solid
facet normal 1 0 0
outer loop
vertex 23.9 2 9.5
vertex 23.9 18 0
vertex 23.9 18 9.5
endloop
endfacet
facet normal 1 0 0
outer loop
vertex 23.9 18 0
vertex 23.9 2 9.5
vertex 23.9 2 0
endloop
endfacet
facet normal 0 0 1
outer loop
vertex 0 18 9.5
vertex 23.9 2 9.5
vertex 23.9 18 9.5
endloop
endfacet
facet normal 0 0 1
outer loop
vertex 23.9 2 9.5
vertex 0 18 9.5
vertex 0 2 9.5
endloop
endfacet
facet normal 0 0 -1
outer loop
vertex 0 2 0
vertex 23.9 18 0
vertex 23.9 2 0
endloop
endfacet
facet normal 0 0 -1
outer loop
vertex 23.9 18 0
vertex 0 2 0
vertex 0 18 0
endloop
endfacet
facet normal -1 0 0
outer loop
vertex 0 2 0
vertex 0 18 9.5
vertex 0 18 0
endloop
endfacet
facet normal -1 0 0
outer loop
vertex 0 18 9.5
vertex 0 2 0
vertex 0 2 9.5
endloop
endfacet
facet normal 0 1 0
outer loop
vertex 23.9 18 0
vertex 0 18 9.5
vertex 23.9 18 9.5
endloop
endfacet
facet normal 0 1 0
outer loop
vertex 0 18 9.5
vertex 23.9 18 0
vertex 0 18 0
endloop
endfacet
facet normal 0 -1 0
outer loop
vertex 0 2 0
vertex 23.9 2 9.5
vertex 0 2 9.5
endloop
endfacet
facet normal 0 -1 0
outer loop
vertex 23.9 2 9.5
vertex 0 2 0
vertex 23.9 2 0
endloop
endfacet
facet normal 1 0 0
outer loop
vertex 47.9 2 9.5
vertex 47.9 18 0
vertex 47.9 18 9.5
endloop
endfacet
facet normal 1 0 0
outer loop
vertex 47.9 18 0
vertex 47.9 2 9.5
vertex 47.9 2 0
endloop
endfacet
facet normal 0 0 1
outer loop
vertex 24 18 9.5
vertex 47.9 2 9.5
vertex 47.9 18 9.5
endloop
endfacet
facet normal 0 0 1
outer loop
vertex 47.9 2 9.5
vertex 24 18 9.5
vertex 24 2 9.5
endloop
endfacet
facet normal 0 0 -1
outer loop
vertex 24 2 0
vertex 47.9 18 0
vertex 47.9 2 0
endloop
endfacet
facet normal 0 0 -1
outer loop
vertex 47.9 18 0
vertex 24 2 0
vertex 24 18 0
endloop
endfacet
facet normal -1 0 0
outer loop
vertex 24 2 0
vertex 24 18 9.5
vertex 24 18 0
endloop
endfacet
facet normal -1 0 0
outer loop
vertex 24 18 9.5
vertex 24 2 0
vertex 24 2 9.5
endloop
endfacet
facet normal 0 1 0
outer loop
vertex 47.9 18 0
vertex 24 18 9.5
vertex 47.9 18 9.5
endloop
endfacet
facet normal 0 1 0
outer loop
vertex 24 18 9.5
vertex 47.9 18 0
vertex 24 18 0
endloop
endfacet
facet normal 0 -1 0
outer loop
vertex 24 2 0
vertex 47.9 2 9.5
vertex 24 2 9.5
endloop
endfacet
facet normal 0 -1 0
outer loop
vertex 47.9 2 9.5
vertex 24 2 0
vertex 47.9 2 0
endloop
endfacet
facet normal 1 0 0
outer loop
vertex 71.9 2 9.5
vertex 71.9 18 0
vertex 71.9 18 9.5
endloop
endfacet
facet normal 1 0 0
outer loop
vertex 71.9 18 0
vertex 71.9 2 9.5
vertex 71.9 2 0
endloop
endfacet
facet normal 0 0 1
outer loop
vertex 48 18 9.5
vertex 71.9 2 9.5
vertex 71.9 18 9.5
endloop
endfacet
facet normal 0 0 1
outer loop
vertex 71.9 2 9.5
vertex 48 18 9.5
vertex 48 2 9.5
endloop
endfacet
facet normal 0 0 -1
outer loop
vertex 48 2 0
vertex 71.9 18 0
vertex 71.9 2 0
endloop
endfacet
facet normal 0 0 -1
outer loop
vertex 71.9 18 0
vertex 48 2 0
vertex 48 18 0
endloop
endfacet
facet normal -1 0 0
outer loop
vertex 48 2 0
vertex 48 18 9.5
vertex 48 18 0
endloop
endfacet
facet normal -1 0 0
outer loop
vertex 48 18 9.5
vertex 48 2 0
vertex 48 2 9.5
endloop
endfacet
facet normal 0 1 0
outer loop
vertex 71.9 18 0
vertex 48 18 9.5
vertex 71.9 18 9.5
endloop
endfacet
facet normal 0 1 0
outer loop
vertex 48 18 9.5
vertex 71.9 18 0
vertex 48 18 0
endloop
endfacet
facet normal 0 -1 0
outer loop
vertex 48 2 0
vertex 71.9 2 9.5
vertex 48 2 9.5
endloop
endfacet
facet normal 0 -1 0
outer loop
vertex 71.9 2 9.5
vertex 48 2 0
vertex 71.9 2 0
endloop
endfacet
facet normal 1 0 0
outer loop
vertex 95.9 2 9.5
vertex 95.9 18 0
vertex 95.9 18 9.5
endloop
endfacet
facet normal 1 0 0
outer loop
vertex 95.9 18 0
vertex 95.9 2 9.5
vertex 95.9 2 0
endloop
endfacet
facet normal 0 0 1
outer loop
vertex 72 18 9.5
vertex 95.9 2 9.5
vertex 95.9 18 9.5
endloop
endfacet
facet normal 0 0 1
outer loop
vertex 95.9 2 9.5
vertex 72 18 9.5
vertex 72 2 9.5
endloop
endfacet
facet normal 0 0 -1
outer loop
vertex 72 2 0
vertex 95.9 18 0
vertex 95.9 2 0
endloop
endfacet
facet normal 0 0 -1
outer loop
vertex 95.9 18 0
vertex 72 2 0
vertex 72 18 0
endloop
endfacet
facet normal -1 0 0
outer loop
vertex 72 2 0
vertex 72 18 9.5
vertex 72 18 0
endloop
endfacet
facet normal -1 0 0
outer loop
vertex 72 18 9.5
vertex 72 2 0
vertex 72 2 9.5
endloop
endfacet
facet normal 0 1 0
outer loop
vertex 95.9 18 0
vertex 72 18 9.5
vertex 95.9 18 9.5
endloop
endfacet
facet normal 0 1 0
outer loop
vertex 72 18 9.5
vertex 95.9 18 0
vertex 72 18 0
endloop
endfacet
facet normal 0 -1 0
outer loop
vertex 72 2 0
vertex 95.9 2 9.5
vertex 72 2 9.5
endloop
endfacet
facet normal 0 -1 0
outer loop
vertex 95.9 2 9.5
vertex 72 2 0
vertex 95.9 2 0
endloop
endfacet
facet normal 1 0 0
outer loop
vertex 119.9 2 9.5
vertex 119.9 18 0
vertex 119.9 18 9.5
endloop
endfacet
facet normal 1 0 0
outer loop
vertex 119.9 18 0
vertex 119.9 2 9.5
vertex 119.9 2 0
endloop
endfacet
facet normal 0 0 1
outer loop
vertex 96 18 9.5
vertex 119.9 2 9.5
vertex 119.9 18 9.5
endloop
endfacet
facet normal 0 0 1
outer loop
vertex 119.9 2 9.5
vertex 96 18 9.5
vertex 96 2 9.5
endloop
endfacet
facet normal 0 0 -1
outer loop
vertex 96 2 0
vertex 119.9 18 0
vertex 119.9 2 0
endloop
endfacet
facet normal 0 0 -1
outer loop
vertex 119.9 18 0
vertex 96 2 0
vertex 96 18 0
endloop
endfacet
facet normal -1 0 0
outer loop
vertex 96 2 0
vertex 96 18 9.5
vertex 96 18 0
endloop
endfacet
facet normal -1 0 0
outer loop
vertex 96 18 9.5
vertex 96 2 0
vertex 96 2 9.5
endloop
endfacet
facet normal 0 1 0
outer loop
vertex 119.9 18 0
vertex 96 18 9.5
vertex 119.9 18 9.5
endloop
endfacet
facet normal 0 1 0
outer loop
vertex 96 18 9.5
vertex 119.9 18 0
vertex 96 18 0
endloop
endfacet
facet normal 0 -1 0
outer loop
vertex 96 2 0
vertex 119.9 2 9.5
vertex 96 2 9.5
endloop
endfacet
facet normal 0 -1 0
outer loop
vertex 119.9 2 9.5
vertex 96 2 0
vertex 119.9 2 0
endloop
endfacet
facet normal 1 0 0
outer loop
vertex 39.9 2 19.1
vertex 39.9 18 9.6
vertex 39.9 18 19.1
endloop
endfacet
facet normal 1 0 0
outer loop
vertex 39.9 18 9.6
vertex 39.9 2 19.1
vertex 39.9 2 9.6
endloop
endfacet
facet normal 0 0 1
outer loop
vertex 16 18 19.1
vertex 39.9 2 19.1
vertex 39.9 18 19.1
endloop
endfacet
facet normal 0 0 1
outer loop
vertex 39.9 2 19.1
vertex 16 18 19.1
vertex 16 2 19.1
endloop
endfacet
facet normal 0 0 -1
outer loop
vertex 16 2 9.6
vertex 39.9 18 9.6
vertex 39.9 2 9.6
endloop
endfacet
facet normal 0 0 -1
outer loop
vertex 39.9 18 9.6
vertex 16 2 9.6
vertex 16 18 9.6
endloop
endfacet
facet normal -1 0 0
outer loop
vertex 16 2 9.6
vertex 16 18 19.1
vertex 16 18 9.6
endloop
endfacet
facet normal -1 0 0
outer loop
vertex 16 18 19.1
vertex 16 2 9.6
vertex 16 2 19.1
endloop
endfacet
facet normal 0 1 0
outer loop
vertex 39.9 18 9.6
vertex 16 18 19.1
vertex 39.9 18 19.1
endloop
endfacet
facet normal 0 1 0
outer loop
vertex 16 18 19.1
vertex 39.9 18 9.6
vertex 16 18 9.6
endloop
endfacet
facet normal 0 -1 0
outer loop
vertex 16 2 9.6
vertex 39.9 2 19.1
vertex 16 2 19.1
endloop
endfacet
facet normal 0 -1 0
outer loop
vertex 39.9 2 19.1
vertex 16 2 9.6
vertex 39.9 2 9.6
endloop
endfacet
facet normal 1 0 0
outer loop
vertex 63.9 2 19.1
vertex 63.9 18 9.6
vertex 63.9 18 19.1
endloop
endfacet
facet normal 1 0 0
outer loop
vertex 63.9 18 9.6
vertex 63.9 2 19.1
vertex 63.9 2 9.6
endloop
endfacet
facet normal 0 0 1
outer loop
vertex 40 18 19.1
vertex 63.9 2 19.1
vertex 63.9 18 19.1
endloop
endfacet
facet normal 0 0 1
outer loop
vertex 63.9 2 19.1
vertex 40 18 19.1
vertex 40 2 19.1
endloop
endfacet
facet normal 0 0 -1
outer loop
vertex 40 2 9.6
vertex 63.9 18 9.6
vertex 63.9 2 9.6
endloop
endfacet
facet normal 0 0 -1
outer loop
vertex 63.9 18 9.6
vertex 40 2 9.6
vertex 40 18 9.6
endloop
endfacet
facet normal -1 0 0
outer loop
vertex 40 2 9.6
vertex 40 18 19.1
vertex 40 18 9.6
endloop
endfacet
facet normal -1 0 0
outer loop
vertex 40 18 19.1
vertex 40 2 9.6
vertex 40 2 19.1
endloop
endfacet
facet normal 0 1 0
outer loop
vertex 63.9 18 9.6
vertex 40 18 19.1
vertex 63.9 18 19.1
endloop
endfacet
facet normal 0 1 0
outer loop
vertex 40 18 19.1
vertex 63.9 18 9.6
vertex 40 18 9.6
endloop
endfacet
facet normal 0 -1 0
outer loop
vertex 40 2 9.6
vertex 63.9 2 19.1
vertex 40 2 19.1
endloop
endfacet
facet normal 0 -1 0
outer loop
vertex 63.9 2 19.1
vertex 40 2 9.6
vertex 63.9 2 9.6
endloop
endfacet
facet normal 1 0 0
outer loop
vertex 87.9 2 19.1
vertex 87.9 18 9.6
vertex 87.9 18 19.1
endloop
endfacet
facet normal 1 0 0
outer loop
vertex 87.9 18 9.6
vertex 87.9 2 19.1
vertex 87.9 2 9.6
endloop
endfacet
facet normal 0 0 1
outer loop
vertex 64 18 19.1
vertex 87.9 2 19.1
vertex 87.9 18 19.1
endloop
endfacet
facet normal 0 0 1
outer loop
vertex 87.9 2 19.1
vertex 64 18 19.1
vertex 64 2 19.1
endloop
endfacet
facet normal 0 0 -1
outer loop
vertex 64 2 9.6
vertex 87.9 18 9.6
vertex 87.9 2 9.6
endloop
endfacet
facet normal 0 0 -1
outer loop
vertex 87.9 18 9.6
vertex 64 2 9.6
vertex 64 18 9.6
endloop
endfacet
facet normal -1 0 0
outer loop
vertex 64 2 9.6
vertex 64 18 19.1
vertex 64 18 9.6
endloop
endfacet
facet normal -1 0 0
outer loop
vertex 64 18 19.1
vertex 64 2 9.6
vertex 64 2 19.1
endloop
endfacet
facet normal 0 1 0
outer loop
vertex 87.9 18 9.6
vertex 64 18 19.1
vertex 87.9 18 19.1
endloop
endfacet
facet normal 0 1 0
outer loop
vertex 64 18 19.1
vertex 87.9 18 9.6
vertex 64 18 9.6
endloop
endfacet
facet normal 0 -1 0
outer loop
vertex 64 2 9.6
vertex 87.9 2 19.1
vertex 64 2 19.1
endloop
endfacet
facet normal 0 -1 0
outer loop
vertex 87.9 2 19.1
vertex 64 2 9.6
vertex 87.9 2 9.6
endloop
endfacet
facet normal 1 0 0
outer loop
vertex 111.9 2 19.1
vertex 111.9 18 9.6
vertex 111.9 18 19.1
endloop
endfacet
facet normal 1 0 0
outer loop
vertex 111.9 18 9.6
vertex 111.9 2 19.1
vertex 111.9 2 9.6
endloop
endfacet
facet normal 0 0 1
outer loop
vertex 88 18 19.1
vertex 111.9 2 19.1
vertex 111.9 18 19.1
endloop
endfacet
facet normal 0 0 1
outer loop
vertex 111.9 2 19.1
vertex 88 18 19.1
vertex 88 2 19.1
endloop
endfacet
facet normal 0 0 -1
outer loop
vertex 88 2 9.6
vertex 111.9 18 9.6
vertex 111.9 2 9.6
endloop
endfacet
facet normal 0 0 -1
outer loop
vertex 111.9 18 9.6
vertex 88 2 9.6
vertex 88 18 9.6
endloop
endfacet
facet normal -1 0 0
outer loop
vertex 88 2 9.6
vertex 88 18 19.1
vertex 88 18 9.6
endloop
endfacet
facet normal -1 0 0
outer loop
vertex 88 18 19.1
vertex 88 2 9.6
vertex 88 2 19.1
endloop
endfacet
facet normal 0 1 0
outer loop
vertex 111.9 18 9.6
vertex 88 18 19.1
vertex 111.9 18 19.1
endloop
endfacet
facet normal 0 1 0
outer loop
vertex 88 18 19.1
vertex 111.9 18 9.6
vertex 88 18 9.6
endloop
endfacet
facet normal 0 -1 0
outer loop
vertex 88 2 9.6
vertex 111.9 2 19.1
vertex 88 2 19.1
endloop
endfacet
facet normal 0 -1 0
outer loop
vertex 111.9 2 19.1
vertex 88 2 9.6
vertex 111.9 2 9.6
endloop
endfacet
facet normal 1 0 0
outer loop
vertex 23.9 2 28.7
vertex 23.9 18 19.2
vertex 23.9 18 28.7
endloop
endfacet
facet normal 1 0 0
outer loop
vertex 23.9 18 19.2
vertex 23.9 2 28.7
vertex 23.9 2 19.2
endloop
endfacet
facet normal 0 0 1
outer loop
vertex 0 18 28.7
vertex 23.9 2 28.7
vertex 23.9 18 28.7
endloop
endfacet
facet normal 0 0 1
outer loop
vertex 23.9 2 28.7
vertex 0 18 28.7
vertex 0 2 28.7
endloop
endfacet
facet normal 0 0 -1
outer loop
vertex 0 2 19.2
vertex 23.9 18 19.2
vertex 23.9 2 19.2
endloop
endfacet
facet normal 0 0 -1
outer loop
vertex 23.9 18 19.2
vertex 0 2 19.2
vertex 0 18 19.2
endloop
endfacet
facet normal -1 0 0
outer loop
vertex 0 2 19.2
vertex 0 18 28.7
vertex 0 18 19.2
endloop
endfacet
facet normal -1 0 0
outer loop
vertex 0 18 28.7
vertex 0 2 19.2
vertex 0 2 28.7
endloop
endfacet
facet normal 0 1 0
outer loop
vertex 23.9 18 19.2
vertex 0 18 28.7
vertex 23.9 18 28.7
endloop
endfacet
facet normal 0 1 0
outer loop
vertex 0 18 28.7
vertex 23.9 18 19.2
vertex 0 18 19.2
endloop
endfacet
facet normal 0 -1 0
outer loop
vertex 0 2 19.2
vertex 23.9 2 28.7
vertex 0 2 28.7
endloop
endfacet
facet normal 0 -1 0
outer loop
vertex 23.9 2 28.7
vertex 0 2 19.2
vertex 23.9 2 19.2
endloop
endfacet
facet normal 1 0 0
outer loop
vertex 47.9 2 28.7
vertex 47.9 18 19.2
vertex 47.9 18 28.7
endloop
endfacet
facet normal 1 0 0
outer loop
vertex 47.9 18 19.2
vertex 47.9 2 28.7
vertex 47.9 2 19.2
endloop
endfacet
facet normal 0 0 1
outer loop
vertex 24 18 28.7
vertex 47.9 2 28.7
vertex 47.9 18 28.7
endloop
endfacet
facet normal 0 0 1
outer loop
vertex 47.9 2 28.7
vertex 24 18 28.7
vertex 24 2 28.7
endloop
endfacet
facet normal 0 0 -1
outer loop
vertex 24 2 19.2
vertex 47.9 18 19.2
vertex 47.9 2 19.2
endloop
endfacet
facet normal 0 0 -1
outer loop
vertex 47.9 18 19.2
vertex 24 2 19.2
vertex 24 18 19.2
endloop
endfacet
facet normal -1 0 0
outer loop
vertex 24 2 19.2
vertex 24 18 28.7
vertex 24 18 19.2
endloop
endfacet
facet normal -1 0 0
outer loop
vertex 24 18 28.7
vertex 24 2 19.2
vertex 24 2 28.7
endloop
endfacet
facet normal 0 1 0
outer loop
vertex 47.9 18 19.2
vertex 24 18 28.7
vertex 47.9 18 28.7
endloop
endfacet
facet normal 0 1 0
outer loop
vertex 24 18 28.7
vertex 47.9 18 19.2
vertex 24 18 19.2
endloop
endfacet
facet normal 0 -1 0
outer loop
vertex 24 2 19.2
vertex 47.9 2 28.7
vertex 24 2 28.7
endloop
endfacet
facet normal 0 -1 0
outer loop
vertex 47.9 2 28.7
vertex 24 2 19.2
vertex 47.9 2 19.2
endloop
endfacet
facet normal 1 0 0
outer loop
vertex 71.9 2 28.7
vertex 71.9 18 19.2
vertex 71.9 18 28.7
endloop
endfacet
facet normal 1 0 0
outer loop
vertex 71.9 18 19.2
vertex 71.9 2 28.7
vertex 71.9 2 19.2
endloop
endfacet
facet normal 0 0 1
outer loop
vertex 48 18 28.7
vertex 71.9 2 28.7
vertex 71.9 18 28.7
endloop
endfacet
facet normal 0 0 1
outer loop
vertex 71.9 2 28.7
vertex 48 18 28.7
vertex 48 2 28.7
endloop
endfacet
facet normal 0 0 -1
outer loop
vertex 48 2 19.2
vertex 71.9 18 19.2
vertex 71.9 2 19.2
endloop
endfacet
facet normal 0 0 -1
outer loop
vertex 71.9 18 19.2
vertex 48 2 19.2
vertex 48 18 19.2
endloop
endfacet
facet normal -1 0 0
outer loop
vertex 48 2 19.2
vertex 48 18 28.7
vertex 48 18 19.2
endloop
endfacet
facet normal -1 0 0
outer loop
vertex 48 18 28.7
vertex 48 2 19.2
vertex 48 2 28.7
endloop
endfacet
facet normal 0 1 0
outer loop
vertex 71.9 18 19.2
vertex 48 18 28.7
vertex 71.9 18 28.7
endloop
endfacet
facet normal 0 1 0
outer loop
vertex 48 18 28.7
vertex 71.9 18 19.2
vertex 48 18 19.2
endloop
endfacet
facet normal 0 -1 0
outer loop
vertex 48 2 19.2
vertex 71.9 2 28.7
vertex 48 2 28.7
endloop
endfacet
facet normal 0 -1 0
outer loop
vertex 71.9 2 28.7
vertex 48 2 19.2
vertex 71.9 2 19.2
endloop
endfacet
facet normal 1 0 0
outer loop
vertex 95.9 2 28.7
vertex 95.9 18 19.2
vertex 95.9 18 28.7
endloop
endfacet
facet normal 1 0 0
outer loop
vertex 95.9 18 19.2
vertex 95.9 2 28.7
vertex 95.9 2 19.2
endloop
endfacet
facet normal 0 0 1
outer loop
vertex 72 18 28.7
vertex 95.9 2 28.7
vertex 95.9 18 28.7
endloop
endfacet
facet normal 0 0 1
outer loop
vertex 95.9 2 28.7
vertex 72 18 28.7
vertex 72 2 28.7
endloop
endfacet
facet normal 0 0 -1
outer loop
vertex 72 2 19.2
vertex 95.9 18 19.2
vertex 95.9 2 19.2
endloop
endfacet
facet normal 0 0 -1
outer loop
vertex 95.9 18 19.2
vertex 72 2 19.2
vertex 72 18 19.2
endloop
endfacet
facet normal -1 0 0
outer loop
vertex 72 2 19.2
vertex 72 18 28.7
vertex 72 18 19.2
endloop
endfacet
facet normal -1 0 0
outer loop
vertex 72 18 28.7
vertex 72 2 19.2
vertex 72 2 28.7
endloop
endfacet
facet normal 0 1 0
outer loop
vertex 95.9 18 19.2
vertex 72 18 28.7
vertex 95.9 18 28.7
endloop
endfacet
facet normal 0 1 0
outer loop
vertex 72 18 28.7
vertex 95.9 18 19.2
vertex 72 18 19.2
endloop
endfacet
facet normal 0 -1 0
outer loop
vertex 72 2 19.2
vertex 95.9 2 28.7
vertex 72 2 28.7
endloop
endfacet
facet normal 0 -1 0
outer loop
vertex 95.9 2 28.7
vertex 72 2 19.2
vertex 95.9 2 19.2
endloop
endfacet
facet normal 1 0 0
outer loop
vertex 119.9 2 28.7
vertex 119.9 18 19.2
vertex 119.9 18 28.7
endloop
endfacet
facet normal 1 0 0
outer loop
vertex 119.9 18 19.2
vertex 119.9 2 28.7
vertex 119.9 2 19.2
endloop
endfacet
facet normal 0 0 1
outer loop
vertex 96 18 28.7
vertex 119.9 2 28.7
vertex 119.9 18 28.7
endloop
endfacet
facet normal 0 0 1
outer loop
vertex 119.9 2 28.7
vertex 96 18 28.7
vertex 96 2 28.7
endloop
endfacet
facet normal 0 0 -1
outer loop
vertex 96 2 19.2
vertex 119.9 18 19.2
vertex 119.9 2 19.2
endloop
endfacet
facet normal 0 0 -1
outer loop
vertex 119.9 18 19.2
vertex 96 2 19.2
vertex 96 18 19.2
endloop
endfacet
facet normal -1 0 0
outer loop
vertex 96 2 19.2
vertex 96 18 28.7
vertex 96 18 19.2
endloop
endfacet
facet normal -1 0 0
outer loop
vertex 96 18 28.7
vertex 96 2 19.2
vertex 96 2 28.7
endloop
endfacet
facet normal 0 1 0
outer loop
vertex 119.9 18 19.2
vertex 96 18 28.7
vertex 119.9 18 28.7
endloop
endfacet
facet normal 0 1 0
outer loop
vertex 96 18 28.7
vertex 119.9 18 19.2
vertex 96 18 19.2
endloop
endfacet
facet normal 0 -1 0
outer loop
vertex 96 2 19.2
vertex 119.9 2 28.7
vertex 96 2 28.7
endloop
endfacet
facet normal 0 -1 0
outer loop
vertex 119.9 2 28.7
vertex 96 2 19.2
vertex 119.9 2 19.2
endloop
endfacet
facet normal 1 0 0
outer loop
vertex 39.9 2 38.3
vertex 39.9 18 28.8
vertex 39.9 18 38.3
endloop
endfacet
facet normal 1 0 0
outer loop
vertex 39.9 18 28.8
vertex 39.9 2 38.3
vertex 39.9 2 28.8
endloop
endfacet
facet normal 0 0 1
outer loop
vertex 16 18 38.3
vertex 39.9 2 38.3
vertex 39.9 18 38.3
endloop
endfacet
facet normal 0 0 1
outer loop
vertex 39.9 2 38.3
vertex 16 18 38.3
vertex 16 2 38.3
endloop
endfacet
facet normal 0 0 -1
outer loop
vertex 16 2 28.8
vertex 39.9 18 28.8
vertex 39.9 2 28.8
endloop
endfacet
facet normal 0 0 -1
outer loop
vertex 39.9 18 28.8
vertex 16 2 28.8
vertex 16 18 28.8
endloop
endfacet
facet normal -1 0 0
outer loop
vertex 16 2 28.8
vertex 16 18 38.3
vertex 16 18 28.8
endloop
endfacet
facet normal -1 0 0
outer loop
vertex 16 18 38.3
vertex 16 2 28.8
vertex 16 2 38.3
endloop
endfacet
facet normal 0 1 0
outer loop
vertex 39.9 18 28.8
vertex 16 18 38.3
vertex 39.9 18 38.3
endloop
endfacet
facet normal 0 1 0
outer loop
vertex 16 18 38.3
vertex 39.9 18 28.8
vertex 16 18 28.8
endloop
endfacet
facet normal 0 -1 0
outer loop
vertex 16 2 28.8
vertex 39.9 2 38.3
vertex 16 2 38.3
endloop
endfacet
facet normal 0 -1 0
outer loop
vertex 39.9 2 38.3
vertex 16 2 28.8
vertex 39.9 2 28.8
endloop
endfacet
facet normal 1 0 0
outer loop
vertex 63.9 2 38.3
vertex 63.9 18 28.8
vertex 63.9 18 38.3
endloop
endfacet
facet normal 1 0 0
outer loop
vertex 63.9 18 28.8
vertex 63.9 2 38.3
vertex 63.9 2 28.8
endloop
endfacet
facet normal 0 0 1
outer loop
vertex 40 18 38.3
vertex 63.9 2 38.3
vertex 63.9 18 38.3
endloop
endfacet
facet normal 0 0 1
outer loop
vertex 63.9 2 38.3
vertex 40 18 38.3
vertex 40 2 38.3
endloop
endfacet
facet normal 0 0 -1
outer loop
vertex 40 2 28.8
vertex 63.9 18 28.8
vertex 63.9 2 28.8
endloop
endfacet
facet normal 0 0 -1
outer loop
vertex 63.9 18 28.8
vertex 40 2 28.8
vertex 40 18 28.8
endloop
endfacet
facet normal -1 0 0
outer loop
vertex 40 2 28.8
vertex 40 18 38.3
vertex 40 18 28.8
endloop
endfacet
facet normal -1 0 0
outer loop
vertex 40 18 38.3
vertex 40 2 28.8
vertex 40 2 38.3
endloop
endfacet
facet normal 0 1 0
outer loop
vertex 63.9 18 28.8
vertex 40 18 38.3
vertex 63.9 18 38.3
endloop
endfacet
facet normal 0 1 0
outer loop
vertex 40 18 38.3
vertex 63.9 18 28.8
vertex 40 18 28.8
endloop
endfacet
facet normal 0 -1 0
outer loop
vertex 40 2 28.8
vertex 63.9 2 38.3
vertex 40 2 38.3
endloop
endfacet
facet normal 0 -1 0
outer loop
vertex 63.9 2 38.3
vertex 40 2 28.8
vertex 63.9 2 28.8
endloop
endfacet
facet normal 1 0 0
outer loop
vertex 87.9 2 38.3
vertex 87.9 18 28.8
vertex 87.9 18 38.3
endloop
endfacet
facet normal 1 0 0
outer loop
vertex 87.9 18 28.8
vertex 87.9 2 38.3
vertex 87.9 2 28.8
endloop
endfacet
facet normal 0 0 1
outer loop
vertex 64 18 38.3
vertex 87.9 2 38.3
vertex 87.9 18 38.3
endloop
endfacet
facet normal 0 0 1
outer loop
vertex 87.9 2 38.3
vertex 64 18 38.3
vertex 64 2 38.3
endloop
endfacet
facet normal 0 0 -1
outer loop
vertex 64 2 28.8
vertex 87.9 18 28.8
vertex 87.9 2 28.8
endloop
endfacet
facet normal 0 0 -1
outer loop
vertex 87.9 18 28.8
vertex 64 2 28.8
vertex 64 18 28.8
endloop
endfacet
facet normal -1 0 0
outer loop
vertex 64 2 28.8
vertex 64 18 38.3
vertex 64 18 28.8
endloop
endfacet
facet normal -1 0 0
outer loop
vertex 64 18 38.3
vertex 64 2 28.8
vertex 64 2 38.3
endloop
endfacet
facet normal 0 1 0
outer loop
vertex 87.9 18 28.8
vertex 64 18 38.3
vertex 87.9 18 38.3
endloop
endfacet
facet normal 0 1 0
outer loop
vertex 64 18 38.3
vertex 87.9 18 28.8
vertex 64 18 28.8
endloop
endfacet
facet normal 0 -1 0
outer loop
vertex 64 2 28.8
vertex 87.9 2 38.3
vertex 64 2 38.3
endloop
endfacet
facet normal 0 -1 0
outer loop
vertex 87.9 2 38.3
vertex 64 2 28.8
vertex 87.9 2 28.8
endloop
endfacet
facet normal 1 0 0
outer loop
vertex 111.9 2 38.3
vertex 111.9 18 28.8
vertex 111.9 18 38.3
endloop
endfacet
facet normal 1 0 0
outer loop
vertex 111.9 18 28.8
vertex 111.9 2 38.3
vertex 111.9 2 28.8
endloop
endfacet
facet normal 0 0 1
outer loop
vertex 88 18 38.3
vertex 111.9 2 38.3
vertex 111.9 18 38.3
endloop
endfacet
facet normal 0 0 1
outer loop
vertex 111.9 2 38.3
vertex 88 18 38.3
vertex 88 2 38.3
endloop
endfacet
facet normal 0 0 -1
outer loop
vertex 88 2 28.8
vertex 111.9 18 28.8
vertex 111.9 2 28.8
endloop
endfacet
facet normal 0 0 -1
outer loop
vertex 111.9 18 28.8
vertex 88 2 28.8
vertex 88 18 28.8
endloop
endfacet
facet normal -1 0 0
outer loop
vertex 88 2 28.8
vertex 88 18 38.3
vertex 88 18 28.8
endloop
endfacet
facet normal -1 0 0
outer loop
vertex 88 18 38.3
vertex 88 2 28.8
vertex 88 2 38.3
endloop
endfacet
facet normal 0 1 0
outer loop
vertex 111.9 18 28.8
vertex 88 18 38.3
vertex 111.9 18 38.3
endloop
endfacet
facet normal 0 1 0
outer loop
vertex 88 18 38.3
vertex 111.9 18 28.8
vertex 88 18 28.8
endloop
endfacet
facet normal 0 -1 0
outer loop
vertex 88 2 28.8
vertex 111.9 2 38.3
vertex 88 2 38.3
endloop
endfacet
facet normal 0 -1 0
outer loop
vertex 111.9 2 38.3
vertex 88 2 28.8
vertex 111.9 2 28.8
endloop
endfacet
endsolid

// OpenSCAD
// file: LEGO-standin.scad
LEGObrick();

module LEGObrick(studs_per_row=3) {
    cube([23.9, 16, 9.5]);
}
// main file
use <LEGO-standin.scad>

for (Xposition = [0: 24: 100]) {
    translate ([Xposition, 2, 0]) LEGObrick();
}

for (Xposition = [16: 24: 100]) {
    translate ([Xposition, 2, 9.6]) LEGObrick();
}

for (Xposition = [0: 24: 100]){
    translate ([Xposition, 2, 2*9.6]) LEGObrick();
}

for (Xposition = [16: 24: 100]) {
    translate ([Xposition, 2, 3*9.6]) LEGObrick();
}
